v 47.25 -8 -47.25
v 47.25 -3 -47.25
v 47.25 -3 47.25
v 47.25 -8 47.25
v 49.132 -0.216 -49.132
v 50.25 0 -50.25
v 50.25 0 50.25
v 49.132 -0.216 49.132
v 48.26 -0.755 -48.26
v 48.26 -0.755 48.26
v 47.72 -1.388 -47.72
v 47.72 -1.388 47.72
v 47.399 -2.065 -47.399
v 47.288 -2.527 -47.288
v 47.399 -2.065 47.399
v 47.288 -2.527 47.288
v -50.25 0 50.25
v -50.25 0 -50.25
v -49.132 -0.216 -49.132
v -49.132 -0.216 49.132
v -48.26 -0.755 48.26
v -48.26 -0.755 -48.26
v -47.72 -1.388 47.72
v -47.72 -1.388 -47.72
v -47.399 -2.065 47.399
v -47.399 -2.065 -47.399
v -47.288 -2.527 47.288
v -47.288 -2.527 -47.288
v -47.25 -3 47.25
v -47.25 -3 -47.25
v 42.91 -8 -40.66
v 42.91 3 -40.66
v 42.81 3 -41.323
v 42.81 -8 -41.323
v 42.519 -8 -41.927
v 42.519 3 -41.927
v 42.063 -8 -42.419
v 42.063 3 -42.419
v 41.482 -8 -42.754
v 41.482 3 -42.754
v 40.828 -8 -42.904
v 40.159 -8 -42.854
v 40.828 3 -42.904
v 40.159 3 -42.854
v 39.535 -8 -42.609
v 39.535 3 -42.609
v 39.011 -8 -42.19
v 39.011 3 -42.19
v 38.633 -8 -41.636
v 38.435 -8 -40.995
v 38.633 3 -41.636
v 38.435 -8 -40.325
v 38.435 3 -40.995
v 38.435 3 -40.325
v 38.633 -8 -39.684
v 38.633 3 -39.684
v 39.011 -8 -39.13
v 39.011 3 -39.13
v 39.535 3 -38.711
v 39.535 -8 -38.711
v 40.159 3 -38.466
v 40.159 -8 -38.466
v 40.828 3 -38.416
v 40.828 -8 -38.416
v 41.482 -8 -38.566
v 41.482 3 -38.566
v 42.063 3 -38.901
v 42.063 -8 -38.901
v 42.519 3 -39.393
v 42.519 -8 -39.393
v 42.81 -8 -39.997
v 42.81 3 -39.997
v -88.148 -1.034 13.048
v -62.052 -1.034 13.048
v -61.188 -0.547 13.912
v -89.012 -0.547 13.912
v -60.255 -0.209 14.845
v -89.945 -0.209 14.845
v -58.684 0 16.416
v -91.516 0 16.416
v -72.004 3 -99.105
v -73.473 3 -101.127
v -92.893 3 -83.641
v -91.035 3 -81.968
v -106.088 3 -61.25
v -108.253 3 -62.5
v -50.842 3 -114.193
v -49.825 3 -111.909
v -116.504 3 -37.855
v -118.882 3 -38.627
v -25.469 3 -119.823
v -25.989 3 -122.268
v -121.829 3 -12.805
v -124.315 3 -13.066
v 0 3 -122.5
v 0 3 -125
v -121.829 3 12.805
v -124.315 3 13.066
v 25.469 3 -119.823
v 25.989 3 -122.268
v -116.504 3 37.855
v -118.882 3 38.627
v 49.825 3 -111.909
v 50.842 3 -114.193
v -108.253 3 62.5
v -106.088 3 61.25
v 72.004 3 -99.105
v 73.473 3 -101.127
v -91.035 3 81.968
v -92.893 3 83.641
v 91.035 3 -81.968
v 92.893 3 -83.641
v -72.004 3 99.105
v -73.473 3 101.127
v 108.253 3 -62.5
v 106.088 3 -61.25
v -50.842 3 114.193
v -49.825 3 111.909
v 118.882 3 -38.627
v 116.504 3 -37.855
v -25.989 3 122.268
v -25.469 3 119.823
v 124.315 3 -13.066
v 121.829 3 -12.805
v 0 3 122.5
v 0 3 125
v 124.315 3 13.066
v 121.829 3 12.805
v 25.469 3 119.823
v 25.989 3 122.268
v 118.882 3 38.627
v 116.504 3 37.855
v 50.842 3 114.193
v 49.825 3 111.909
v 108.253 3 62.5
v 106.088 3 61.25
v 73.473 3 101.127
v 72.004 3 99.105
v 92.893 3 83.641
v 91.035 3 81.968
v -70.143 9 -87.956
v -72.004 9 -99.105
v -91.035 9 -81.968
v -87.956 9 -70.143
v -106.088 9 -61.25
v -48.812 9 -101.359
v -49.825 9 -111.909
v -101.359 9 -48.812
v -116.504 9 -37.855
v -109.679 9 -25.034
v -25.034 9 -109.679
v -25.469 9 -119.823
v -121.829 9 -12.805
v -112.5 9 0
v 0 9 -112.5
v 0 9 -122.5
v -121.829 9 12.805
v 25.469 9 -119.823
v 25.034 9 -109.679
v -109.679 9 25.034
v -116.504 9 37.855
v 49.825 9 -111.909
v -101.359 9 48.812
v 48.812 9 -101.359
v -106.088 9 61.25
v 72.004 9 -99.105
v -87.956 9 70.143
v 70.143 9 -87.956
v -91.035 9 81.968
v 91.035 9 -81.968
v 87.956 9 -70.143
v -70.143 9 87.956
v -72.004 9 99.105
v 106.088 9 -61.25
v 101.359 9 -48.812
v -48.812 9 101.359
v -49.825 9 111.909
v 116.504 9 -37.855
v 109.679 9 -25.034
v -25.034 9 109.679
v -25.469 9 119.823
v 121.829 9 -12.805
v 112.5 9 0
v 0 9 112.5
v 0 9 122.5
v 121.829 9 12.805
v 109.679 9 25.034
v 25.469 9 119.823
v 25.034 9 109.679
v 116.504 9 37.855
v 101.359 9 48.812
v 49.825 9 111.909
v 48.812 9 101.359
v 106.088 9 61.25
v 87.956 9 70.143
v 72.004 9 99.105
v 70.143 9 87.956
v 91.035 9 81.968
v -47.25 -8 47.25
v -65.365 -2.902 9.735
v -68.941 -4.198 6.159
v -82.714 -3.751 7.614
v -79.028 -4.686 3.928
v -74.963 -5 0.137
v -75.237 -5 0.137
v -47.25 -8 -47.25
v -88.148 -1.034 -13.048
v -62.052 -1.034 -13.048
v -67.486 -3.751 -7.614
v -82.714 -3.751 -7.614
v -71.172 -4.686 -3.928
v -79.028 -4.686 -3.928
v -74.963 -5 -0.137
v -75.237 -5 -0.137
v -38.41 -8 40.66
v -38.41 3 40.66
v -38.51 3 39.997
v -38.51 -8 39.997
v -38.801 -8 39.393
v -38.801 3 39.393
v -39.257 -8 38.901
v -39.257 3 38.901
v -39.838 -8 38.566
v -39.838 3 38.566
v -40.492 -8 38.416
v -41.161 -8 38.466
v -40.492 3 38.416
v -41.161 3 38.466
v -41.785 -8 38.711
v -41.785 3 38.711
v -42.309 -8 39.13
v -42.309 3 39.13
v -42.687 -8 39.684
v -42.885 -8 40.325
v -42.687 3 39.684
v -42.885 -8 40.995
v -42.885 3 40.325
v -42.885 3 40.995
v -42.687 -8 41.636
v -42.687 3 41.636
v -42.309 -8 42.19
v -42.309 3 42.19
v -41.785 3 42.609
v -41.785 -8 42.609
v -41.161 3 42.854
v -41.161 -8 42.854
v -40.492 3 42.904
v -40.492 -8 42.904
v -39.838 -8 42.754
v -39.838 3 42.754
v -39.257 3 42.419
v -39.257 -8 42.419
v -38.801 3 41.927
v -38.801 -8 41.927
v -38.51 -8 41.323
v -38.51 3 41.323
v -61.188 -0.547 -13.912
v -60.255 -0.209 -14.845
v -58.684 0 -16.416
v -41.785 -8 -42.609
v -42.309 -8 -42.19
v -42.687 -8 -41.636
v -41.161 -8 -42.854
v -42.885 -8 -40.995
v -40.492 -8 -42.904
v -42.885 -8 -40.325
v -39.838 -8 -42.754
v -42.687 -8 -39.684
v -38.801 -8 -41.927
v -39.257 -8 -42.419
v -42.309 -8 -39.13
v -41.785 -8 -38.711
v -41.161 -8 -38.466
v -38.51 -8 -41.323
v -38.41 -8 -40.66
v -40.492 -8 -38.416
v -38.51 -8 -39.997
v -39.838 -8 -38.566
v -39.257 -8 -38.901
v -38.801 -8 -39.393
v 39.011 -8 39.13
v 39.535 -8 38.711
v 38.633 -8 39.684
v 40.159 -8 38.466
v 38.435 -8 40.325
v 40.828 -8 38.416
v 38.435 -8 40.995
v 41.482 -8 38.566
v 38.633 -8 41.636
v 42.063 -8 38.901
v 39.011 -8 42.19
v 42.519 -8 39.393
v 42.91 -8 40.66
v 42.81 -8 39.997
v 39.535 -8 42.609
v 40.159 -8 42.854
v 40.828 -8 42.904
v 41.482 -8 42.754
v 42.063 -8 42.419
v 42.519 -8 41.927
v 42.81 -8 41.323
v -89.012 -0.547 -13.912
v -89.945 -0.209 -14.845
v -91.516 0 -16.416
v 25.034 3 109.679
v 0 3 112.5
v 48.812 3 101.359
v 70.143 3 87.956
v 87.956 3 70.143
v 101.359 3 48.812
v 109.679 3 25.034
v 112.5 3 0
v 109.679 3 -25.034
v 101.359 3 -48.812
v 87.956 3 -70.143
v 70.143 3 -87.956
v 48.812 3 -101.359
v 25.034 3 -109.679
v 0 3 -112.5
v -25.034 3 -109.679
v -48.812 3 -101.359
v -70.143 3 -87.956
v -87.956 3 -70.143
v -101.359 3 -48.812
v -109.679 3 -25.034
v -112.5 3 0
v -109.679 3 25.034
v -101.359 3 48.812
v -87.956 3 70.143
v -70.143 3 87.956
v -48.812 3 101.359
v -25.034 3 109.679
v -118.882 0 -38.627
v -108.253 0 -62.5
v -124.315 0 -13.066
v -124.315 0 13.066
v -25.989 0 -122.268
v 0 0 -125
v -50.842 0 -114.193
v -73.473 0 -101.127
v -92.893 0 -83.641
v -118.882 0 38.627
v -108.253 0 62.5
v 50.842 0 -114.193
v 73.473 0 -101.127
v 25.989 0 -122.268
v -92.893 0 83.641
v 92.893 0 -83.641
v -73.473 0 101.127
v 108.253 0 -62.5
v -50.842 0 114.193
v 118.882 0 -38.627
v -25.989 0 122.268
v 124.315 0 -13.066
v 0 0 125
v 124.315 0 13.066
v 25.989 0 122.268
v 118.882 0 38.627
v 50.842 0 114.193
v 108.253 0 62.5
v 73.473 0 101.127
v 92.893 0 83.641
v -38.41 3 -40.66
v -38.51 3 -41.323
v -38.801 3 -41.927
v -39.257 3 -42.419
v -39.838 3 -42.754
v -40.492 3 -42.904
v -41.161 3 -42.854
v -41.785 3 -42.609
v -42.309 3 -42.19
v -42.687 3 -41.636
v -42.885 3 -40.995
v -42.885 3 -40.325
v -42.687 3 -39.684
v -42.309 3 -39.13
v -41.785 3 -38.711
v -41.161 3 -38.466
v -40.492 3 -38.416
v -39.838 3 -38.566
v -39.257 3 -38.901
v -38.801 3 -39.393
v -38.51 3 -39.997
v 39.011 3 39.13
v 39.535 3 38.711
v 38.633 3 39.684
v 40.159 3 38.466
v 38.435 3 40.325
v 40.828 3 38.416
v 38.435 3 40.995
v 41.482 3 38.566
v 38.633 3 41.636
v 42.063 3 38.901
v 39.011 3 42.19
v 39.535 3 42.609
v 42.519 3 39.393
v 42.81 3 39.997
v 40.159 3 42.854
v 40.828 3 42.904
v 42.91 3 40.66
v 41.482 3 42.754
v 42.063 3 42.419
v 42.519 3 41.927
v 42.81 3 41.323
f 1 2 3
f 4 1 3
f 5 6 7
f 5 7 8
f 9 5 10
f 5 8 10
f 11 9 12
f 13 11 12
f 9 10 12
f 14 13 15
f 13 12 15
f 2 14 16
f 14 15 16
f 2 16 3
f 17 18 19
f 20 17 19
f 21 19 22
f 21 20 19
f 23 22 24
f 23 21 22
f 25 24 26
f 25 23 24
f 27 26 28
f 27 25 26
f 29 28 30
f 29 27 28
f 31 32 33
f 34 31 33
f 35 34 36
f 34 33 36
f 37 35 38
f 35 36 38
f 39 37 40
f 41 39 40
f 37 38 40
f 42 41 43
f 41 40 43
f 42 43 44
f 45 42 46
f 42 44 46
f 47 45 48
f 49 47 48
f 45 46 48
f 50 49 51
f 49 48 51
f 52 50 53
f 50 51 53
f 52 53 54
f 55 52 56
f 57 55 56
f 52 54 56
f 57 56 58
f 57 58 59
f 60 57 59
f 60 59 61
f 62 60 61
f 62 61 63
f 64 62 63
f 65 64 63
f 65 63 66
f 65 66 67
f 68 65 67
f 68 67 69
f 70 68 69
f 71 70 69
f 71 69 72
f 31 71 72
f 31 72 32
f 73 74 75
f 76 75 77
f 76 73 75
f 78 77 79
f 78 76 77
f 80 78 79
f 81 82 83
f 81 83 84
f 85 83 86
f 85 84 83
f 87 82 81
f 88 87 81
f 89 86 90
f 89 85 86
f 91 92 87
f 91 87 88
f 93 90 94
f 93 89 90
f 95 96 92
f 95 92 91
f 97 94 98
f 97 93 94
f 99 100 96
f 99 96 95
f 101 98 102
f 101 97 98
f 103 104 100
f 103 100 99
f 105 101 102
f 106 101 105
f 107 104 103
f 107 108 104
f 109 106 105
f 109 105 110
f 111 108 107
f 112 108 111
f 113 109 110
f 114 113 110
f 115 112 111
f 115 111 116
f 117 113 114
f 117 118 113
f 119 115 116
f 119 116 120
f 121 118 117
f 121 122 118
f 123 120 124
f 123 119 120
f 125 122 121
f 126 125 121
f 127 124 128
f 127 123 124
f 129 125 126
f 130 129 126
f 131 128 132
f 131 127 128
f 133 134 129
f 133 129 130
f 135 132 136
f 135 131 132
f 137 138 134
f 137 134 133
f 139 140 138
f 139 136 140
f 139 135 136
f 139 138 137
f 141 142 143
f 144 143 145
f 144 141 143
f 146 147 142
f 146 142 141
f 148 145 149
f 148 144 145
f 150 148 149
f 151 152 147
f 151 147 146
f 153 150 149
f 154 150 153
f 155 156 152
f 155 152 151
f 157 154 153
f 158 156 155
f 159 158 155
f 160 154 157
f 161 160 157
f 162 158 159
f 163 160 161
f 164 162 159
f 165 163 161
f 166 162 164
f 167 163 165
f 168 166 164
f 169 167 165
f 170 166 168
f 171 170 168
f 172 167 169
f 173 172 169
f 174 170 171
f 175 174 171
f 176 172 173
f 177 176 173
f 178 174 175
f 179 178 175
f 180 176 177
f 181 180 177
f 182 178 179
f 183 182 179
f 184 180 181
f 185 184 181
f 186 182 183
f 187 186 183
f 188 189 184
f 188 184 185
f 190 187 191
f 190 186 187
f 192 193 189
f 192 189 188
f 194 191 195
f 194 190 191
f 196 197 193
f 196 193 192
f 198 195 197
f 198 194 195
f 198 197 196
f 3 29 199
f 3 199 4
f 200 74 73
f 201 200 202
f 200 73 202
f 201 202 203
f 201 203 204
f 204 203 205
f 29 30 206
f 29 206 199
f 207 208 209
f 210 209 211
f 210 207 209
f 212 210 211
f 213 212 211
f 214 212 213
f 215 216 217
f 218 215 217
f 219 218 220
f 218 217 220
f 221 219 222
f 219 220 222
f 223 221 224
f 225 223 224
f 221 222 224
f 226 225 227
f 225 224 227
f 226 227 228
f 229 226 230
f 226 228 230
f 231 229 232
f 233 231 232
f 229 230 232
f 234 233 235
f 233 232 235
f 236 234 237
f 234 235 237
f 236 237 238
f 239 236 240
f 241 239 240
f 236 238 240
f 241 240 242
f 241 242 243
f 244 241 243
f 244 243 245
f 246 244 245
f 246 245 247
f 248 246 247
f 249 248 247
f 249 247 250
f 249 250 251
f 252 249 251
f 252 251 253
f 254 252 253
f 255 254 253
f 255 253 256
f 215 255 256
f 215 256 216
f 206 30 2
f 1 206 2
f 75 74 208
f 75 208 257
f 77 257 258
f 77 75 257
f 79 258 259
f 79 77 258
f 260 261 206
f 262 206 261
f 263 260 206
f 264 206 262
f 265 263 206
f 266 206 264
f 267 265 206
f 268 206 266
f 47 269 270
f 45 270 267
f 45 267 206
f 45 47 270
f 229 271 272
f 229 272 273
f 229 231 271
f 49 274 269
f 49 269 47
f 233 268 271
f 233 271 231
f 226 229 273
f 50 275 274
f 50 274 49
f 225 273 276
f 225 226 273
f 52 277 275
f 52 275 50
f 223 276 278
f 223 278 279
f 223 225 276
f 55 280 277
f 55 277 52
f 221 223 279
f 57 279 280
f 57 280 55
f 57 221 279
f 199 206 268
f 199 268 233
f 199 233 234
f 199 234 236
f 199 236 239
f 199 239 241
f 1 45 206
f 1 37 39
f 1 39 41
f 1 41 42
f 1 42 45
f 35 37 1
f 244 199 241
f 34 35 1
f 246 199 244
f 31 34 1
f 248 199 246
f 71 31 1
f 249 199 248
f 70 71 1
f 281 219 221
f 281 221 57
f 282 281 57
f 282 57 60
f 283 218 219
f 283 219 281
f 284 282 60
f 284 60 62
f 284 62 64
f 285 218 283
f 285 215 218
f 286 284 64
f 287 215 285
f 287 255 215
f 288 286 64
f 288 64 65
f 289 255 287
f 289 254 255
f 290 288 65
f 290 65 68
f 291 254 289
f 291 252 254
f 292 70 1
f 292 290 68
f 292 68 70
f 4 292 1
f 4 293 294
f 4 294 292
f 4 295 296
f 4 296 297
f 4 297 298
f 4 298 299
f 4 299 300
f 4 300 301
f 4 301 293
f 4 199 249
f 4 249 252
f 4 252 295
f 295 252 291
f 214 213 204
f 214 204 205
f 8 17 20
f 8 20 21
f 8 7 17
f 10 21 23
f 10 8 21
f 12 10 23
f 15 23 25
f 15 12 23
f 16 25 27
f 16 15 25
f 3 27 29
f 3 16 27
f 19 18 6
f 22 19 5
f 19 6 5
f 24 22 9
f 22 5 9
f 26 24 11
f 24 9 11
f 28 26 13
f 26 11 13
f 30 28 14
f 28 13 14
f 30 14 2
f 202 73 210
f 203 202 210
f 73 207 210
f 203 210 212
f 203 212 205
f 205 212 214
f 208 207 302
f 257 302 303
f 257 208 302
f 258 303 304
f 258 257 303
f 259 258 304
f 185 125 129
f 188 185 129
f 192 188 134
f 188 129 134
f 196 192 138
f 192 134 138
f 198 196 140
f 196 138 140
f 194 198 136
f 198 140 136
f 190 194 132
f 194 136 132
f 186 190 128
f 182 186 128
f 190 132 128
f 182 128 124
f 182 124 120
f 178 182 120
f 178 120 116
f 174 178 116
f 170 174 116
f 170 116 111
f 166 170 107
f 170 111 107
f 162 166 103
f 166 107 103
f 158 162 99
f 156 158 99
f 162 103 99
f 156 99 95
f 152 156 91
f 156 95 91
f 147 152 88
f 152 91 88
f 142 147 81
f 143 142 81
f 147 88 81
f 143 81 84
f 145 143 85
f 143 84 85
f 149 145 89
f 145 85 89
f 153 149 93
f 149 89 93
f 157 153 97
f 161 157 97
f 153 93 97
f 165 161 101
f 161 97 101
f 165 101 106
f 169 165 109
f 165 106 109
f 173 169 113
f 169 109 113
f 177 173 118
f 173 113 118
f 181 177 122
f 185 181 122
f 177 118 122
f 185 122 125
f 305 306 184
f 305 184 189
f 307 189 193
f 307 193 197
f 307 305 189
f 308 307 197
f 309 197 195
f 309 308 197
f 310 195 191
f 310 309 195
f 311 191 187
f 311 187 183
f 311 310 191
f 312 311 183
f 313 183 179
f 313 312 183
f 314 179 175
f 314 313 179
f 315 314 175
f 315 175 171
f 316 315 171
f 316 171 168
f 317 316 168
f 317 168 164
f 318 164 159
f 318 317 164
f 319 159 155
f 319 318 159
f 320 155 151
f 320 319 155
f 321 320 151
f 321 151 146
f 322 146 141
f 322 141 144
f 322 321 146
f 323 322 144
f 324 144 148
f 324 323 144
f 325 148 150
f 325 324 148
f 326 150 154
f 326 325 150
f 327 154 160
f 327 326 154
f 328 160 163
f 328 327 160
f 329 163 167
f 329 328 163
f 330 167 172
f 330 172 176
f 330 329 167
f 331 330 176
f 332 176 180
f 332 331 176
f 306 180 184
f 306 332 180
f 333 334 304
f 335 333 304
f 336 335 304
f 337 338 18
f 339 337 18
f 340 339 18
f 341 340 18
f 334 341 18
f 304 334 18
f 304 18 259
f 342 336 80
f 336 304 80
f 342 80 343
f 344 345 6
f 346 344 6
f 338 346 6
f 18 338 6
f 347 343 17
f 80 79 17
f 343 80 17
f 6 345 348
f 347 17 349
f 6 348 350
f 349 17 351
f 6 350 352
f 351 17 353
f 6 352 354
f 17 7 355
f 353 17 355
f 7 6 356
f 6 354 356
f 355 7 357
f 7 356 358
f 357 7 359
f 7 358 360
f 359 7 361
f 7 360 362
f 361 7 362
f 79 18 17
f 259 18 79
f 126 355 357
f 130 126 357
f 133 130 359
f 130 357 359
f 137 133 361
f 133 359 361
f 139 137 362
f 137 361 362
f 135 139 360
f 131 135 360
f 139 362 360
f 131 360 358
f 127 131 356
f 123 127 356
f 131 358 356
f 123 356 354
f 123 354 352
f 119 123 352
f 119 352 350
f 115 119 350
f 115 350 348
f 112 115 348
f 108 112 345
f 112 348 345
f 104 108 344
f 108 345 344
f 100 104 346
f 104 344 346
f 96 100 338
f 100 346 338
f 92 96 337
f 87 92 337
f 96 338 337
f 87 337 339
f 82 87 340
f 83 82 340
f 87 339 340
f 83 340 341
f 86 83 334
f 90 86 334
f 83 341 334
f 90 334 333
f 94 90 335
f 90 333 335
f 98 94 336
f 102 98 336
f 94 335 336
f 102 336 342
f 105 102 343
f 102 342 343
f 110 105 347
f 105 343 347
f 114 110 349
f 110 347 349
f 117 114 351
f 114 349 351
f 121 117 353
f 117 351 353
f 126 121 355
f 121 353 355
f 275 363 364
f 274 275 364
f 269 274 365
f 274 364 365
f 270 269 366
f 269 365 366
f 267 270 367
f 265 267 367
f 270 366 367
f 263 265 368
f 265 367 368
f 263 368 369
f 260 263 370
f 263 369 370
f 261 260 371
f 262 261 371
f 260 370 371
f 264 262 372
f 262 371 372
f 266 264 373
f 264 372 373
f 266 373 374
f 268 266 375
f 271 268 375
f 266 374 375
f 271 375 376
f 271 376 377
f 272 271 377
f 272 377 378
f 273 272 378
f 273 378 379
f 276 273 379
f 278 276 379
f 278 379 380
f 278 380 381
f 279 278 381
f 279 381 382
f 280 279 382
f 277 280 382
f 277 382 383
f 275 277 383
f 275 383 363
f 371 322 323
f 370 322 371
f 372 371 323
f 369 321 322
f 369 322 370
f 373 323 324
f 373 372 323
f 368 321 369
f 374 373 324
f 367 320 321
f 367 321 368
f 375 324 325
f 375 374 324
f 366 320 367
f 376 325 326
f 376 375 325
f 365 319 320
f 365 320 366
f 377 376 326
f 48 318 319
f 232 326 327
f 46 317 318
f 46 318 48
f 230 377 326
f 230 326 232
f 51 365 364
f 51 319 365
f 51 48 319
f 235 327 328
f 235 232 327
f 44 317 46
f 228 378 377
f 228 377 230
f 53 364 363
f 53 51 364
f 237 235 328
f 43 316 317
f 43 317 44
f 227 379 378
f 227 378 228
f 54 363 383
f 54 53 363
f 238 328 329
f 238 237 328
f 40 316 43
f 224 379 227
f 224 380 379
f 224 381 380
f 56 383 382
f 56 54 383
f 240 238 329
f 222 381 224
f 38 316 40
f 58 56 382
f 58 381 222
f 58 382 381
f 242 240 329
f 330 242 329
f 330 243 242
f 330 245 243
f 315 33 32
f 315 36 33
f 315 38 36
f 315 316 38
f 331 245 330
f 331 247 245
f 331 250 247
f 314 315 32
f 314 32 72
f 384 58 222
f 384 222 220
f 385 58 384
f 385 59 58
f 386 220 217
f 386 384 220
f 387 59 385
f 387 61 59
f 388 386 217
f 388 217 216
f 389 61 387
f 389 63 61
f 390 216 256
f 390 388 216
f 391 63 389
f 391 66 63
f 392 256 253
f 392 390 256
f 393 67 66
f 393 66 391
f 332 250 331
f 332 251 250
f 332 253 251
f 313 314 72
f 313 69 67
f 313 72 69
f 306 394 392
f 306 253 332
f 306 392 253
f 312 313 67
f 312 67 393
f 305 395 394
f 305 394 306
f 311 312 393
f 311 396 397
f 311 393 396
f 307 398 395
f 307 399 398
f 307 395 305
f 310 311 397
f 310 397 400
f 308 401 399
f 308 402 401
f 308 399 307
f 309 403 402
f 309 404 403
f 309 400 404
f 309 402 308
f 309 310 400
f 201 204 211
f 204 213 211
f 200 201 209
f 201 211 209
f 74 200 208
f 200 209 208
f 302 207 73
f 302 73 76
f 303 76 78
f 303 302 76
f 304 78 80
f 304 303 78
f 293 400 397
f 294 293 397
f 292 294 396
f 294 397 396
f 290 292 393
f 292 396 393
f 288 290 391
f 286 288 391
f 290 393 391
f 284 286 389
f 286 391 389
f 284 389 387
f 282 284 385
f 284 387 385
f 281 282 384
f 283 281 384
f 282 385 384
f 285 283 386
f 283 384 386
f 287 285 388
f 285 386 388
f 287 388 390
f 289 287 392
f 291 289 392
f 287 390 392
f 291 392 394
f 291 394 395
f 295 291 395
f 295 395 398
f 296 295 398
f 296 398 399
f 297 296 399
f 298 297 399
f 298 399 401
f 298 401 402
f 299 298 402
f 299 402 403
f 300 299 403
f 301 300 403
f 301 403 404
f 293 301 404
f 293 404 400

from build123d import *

# Parameters (mm, degrees)
SKETCH1_R            = 125
BOSS_EXTRUDE1_DEPTH  = 3
SKETCH2_R            = 122.5
SKETCH2_R_2          = 112.5
BOSS_EXTRUDE2_DEPTH  = 6
SKETCH3_W            = 94.5
SKETCH3_H            = 94.5
BOSS_EXTRUDE3_DEPTH  = 8
M4_CLEARANCE_HOLE1_D = 4.5
FILLET1_R            = 3
SKETCH8_W            = 21
SKETCH8_H            = 21
BOSS_EXTRUDE4_DEPTH  = 5
FILLET2_R            = 6
FILLET3_R            = 23


with BuildPart() as part:
    # Sketch1 → Boss-Extrude1 (new body)
    with BuildSketch(Plane(origin=(0, 0, 0), x_dir=(1, 0, 0), z_dir=(0, 1, 0))):
        with Locations(Location((0, 0, 0), (0, 0, 270))):
            Circle(SKETCH1_R)
    extrude(amount=BOSS_EXTRUDE1_DEPTH)

    # Sketch2 → Boss-Extrude2 (add)
    with BuildSketch(Plane(origin=(0, 3, 0), x_dir=(1, 0, 0), z_dir=(0, 1, 0))):
        with Locations(Location((0, 0, 0), (0, 0, 270))):
            Circle(SKETCH2_R)
        with Locations(Location((0, 0, 0), (0, 0, 270))):
            Circle(SKETCH2_R_2, mode=Mode.SUBTRACT)
    extrude(amount=BOSS_EXTRUDE2_DEPTH)

    # Sketch3 → Boss-Extrude3 (add)
    with BuildSketch(Plane.XZ):
        Rectangle(SKETCH3_W, SKETCH3_H)
    extrude(amount=BOSS_EXTRUDE3_DEPTH)

    # M4 Clearance Hole1 (through all)
    with Locations(Plane(origin=(0, -8, 0), x_dir=(-1, 0, 0), z_dir=(0, -1, 0))):
        with Locations((40.66, 40.66), (40.66, -40.66), (-40.66, -40.66), (-40.66, 40.66)):
            Hole(M4_CLEARANCE_HOLE1_D / 2)

    # Fillet1
    fillet1_edges = [part.edges().sort_by_distance(p)[0] for p in [
        (0, 0, -47.25),
        (-47.25, 0, 0),
        (0, 0, 47.25),
        (47.25, 0, 0),
    ]]
    fillet(fillet1_edges, radius=FILLET1_R)

    # Sketch8 → Boss-Extrude4 (add)
    with BuildSketch(Plane(origin=(0, 0, 0), x_dir=(-1, 0, 0), z_dir=(0, -1, 0))):
        with Locations((75.1, 0)):
            Rectangle(SKETCH8_W, SKETCH8_H)
    extrude(amount=BOSS_EXTRUDE4_DEPTH)

    # Fillet2
    # the kernel refuses this fillet: 6 mm, written as the material it adds along each edge
    with BuildSketch(Plane(origin=(-64.6, 0, 10.5), x_dir=(1, 0, 0), z_dir=(0, 0, -1)), Plane(origin=(-85.6, 0, 10.5), x_dir=(0, 0, 1), z_dir=(1, 0, 0)), Plane(origin=(-85.6, 0, -10.5), x_dir=(-1, 0, 0), z_dir=(0, 0, 1)), Plane(origin=(-64.6, 0, -10.5), x_dir=(0, 0, -1), z_dir=(-1, 0, 0))) as fillet2_piece_1:
        with BuildLine():
            CenterArc((5.916079783, 6), FILLET2_R, 189.594068227, 80.405931773)
            Line((0, 5), (-0.118321596, 4.98))
            ThreePointArc((-0.118321596, 4.98), (-0.12, 2.5), (-0.12, 0))
            Line((-0.12, 0), (0, -0.12))
            Line((0, -0.12), (5.916079783, -0.12))
            Line((5.916079783, -0.12), (5.916079783, 0))
        make_face()
    extrude(amount=21)
    with BuildSketch(Plane(origin=(-85.6, 0, 10.5), x_dir=(0, 0, 1), z_dir=(1, 0, 0))) as fillet2_piece_2a_section:
        with BuildLine():
            CenterArc((5.916079783, 6), FILLET2_R, 189.594068227, 80.405931773)
            Line((0, 5), (-0.118321596, 4.98))
            ThreePointArc((-0.118321596, 4.98), (-0.12, 2.5), (-0.12, 0))
            Line((-0.12, 0), (0, -0.12))
            Line((0, -0.12), (5.916079783, -0.12))
            Line((5.916079783, -0.12), (5.916079783, 0))
        make_face()
    fillet2_piece_2a = extrude(amount=35.790199458, mode=Mode.PRIVATE)
    fillet2_piece_2a = split(fillet2_piece_2a, bisect_by=Plane(origin=(-64.6, -1.233917871, 11.87196406), z_dir=(1, 0, 0)), keep=Keep.TOP, mode=Mode.PRIVATE)
    with BuildSketch(Plane(origin=(-64.6, 0, 25.290199458), x_dir=(1, 0, 0), z_dir=(0, 0, -1))) as fillet2_piece_2b_section:
        with BuildLine():
            CenterArc((5.916079783, 6), FILLET2_R, 189.594068227, 80.405931773)
            Line((0, 5), (-0.118321596, 4.98))
            ThreePointArc((-0.118321596, 4.98), (-0.12, 2.5), (-0.12, 0))
            Line((-0.12, 0), (0, -0.12))
            Line((0, -0.12), (5.916079783, -0.12))
            Line((5.916079783, -0.12), (5.916079783, 0))
        make_face()
    fillet2_piece_2b = extrude(amount=35.790199458, mode=Mode.PRIVATE)
    fillet2_piece_2b = split(fillet2_piece_2b, bisect_by=Plane(origin=(-63.22803594, -1.233917871, 10.5), z_dir=(0, 0, 1)), keep=Keep.TOP, mode=Mode.PRIVATE)
    fillet2_piece_2 = fillet2_piece_2a & fillet2_piece_2b
    add(fillet2_piece_2)
    with BuildSketch(Plane(origin=(-64.6, 0, 10.5), x_dir=(1, 0, 0), z_dir=(0, 0, -1))) as fillet2_piece_3a_section:
        with BuildLine():
            CenterArc((5.916079783, 6), FILLET2_R, 189.594068227, 80.405931773)
            Line((0, 5), (-0.118321596, 4.98))
            ThreePointArc((-0.118321596, 4.98), (-0.12, 2.5), (-0.12, 0))
            Line((-0.12, 0), (0, -0.12))
            Line((0, -0.12), (5.916079783, -0.12))
            Line((5.916079783, -0.12), (5.916079783, 0))
        make_face()
    fillet2_piece_3a = extrude(amount=35.790199458, mode=Mode.PRIVATE)
    fillet2_piece_3a = split(fillet2_piece_3a, bisect_by=Plane(origin=(-63.22803594, -1.233917871, -10.5), z_dir=(0, 0, -1)), keep=Keep.TOP, mode=Mode.PRIVATE)
    with BuildSketch(Plane(origin=(-49.809800542, 0, -10.5), x_dir=(0, 0, -1), z_dir=(-1, 0, 0))) as fillet2_piece_3b_section:
        with BuildLine():
            CenterArc((5.916079783, 6), FILLET2_R, 189.594068227, 80.405931773)
            Line((0, 5), (-0.118321596, 4.98))
            ThreePointArc((-0.118321596, 4.98), (-0.12, 2.5), (-0.12, 0))
            Line((-0.12, 0), (0, -0.12))
            Line((0, -0.12), (5.916079783, -0.12))
            Line((5.916079783, -0.12), (5.916079783, 0))
        make_face()
    fillet2_piece_3b = extrude(amount=35.790199458, mode=Mode.PRIVATE)
    fillet2_piece_3b = split(fillet2_piece_3b, bisect_by=Plane(origin=(-64.6, -1.233917871, -11.87196406), z_dir=(1, 0, 0)), keep=Keep.TOP, mode=Mode.PRIVATE)
    fillet2_piece_3 = fillet2_piece_3a & fillet2_piece_3b
    add(fillet2_piece_3)
    with BuildSketch(Plane(origin=(-100.390199458, 0, 10.5), x_dir=(0, 0, 1), z_dir=(1, 0, 0))) as fillet2_piece_4a_section:
        with BuildLine():
            CenterArc((5.916079783, 6), FILLET2_R, 189.594068227, 80.405931773)
            Line((0, 5), (-0.118321596, 4.98))
            ThreePointArc((-0.118321596, 4.98), (-0.12, 2.5), (-0.12, 0))
            Line((-0.12, 0), (0, -0.12))
            Line((0, -0.12), (5.916079783, -0.12))
            Line((5.916079783, -0.12), (5.916079783, 0))
        make_face()
    fillet2_piece_4a = extrude(amount=35.790199458, mode=Mode.PRIVATE)
    fillet2_piece_4a = split(fillet2_piece_4a, bisect_by=Plane(origin=(-85.6, -1.233917871, 11.87196406), z_dir=(-1, 0, 0)), keep=Keep.TOP, mode=Mode.PRIVATE)
    with BuildSketch(Plane(origin=(-85.6, 0, -10.5), x_dir=(-1, 0, 0), z_dir=(0, 0, 1))) as fillet2_piece_4b_section:
        with BuildLine():
            CenterArc((5.916079783, 6), FILLET2_R, 189.594068227, 80.405931773)
            Line((0, 5), (-0.118321596, 4.98))
            ThreePointArc((-0.118321596, 4.98), (-0.12, 2.5), (-0.12, 0))
            Line((-0.12, 0), (0, -0.12))
            Line((0, -0.12), (5.916079783, -0.12))
            Line((5.916079783, -0.12), (5.916079783, 0))
        make_face()
    fillet2_piece_4b = extrude(amount=35.790199458, mode=Mode.PRIVATE)
    fillet2_piece_4b = split(fillet2_piece_4b, bisect_by=Plane(origin=(-86.97196406, -1.233917871, 10.5), z_dir=(0, 0, 1)), keep=Keep.TOP, mode=Mode.PRIVATE)
    fillet2_piece_4 = fillet2_piece_4a & fillet2_piece_4b
    add(fillet2_piece_4)
    with BuildSketch(Plane(origin=(-64.6, 0, -10.5), x_dir=(0, 0, -1), z_dir=(-1, 0, 0))) as fillet2_piece_5a_section:
        with BuildLine():
            CenterArc((5.916079783, 6), FILLET2_R, 189.594068227, 80.405931773)
            Line((0, 5), (-0.118321596, 4.98))
            ThreePointArc((-0.118321596, 4.98), (-0.12, 2.5), (-0.12, 0))
            Line((-0.12, 0), (0, -0.12))
            Line((0, -0.12), (5.916079783, -0.12))
            Line((5.916079783, -0.12), (5.916079783, 0))
        make_face()
    fillet2_piece_5a = extrude(amount=35.790199458, mode=Mode.PRIVATE)
    fillet2_piece_5a = split(fillet2_piece_5a, bisect_by=Plane(origin=(-85.6, -1.233917871, -11.87196406), z_dir=(-1, 0, 0)), keep=Keep.TOP, mode=Mode.PRIVATE)
    with BuildSketch(Plane(origin=(-85.6, 0, -25.290199458), x_dir=(-1, 0, 0), z_dir=(0, 0, 1))) as fillet2_piece_5b_section:
        with BuildLine():
            CenterArc((5.916079783, 6), FILLET2_R, 189.594068227, 80.405931773)
            Line((0, 5), (-0.118321596, 4.98))
            ThreePointArc((-0.118321596, 4.98), (-0.12, 2.5), (-0.12, 0))
            Line((-0.12, 0), (0, -0.12))
            Line((0, -0.12), (5.916079783, -0.12))
            Line((5.916079783, -0.12), (5.916079783, 0))
        make_face()
    fillet2_piece_5b = extrude(amount=35.790199458, mode=Mode.PRIVATE)
    fillet2_piece_5b = split(fillet2_piece_5b, bisect_by=Plane(origin=(-86.97196406, -1.233917871, -10.5), z_dir=(0, 0, -1)), keep=Keep.TOP, mode=Mode.PRIVATE)
    fillet2_piece_5 = fillet2_piece_5a & fillet2_piece_5b
    add(fillet2_piece_5)

    # Fillet3
    fillet3_edges = [part.edges().sort_by_distance(p)[0] for p in [
        (-85.6, -5, 0),
        (-75.1, -5, -10.5),
        (-64.6, -5, 0),
        (-75.1, -5, 10.5),
    ]]
    fillet(fillet3_edges, radius=FILLET3_R)


solid = part.part
